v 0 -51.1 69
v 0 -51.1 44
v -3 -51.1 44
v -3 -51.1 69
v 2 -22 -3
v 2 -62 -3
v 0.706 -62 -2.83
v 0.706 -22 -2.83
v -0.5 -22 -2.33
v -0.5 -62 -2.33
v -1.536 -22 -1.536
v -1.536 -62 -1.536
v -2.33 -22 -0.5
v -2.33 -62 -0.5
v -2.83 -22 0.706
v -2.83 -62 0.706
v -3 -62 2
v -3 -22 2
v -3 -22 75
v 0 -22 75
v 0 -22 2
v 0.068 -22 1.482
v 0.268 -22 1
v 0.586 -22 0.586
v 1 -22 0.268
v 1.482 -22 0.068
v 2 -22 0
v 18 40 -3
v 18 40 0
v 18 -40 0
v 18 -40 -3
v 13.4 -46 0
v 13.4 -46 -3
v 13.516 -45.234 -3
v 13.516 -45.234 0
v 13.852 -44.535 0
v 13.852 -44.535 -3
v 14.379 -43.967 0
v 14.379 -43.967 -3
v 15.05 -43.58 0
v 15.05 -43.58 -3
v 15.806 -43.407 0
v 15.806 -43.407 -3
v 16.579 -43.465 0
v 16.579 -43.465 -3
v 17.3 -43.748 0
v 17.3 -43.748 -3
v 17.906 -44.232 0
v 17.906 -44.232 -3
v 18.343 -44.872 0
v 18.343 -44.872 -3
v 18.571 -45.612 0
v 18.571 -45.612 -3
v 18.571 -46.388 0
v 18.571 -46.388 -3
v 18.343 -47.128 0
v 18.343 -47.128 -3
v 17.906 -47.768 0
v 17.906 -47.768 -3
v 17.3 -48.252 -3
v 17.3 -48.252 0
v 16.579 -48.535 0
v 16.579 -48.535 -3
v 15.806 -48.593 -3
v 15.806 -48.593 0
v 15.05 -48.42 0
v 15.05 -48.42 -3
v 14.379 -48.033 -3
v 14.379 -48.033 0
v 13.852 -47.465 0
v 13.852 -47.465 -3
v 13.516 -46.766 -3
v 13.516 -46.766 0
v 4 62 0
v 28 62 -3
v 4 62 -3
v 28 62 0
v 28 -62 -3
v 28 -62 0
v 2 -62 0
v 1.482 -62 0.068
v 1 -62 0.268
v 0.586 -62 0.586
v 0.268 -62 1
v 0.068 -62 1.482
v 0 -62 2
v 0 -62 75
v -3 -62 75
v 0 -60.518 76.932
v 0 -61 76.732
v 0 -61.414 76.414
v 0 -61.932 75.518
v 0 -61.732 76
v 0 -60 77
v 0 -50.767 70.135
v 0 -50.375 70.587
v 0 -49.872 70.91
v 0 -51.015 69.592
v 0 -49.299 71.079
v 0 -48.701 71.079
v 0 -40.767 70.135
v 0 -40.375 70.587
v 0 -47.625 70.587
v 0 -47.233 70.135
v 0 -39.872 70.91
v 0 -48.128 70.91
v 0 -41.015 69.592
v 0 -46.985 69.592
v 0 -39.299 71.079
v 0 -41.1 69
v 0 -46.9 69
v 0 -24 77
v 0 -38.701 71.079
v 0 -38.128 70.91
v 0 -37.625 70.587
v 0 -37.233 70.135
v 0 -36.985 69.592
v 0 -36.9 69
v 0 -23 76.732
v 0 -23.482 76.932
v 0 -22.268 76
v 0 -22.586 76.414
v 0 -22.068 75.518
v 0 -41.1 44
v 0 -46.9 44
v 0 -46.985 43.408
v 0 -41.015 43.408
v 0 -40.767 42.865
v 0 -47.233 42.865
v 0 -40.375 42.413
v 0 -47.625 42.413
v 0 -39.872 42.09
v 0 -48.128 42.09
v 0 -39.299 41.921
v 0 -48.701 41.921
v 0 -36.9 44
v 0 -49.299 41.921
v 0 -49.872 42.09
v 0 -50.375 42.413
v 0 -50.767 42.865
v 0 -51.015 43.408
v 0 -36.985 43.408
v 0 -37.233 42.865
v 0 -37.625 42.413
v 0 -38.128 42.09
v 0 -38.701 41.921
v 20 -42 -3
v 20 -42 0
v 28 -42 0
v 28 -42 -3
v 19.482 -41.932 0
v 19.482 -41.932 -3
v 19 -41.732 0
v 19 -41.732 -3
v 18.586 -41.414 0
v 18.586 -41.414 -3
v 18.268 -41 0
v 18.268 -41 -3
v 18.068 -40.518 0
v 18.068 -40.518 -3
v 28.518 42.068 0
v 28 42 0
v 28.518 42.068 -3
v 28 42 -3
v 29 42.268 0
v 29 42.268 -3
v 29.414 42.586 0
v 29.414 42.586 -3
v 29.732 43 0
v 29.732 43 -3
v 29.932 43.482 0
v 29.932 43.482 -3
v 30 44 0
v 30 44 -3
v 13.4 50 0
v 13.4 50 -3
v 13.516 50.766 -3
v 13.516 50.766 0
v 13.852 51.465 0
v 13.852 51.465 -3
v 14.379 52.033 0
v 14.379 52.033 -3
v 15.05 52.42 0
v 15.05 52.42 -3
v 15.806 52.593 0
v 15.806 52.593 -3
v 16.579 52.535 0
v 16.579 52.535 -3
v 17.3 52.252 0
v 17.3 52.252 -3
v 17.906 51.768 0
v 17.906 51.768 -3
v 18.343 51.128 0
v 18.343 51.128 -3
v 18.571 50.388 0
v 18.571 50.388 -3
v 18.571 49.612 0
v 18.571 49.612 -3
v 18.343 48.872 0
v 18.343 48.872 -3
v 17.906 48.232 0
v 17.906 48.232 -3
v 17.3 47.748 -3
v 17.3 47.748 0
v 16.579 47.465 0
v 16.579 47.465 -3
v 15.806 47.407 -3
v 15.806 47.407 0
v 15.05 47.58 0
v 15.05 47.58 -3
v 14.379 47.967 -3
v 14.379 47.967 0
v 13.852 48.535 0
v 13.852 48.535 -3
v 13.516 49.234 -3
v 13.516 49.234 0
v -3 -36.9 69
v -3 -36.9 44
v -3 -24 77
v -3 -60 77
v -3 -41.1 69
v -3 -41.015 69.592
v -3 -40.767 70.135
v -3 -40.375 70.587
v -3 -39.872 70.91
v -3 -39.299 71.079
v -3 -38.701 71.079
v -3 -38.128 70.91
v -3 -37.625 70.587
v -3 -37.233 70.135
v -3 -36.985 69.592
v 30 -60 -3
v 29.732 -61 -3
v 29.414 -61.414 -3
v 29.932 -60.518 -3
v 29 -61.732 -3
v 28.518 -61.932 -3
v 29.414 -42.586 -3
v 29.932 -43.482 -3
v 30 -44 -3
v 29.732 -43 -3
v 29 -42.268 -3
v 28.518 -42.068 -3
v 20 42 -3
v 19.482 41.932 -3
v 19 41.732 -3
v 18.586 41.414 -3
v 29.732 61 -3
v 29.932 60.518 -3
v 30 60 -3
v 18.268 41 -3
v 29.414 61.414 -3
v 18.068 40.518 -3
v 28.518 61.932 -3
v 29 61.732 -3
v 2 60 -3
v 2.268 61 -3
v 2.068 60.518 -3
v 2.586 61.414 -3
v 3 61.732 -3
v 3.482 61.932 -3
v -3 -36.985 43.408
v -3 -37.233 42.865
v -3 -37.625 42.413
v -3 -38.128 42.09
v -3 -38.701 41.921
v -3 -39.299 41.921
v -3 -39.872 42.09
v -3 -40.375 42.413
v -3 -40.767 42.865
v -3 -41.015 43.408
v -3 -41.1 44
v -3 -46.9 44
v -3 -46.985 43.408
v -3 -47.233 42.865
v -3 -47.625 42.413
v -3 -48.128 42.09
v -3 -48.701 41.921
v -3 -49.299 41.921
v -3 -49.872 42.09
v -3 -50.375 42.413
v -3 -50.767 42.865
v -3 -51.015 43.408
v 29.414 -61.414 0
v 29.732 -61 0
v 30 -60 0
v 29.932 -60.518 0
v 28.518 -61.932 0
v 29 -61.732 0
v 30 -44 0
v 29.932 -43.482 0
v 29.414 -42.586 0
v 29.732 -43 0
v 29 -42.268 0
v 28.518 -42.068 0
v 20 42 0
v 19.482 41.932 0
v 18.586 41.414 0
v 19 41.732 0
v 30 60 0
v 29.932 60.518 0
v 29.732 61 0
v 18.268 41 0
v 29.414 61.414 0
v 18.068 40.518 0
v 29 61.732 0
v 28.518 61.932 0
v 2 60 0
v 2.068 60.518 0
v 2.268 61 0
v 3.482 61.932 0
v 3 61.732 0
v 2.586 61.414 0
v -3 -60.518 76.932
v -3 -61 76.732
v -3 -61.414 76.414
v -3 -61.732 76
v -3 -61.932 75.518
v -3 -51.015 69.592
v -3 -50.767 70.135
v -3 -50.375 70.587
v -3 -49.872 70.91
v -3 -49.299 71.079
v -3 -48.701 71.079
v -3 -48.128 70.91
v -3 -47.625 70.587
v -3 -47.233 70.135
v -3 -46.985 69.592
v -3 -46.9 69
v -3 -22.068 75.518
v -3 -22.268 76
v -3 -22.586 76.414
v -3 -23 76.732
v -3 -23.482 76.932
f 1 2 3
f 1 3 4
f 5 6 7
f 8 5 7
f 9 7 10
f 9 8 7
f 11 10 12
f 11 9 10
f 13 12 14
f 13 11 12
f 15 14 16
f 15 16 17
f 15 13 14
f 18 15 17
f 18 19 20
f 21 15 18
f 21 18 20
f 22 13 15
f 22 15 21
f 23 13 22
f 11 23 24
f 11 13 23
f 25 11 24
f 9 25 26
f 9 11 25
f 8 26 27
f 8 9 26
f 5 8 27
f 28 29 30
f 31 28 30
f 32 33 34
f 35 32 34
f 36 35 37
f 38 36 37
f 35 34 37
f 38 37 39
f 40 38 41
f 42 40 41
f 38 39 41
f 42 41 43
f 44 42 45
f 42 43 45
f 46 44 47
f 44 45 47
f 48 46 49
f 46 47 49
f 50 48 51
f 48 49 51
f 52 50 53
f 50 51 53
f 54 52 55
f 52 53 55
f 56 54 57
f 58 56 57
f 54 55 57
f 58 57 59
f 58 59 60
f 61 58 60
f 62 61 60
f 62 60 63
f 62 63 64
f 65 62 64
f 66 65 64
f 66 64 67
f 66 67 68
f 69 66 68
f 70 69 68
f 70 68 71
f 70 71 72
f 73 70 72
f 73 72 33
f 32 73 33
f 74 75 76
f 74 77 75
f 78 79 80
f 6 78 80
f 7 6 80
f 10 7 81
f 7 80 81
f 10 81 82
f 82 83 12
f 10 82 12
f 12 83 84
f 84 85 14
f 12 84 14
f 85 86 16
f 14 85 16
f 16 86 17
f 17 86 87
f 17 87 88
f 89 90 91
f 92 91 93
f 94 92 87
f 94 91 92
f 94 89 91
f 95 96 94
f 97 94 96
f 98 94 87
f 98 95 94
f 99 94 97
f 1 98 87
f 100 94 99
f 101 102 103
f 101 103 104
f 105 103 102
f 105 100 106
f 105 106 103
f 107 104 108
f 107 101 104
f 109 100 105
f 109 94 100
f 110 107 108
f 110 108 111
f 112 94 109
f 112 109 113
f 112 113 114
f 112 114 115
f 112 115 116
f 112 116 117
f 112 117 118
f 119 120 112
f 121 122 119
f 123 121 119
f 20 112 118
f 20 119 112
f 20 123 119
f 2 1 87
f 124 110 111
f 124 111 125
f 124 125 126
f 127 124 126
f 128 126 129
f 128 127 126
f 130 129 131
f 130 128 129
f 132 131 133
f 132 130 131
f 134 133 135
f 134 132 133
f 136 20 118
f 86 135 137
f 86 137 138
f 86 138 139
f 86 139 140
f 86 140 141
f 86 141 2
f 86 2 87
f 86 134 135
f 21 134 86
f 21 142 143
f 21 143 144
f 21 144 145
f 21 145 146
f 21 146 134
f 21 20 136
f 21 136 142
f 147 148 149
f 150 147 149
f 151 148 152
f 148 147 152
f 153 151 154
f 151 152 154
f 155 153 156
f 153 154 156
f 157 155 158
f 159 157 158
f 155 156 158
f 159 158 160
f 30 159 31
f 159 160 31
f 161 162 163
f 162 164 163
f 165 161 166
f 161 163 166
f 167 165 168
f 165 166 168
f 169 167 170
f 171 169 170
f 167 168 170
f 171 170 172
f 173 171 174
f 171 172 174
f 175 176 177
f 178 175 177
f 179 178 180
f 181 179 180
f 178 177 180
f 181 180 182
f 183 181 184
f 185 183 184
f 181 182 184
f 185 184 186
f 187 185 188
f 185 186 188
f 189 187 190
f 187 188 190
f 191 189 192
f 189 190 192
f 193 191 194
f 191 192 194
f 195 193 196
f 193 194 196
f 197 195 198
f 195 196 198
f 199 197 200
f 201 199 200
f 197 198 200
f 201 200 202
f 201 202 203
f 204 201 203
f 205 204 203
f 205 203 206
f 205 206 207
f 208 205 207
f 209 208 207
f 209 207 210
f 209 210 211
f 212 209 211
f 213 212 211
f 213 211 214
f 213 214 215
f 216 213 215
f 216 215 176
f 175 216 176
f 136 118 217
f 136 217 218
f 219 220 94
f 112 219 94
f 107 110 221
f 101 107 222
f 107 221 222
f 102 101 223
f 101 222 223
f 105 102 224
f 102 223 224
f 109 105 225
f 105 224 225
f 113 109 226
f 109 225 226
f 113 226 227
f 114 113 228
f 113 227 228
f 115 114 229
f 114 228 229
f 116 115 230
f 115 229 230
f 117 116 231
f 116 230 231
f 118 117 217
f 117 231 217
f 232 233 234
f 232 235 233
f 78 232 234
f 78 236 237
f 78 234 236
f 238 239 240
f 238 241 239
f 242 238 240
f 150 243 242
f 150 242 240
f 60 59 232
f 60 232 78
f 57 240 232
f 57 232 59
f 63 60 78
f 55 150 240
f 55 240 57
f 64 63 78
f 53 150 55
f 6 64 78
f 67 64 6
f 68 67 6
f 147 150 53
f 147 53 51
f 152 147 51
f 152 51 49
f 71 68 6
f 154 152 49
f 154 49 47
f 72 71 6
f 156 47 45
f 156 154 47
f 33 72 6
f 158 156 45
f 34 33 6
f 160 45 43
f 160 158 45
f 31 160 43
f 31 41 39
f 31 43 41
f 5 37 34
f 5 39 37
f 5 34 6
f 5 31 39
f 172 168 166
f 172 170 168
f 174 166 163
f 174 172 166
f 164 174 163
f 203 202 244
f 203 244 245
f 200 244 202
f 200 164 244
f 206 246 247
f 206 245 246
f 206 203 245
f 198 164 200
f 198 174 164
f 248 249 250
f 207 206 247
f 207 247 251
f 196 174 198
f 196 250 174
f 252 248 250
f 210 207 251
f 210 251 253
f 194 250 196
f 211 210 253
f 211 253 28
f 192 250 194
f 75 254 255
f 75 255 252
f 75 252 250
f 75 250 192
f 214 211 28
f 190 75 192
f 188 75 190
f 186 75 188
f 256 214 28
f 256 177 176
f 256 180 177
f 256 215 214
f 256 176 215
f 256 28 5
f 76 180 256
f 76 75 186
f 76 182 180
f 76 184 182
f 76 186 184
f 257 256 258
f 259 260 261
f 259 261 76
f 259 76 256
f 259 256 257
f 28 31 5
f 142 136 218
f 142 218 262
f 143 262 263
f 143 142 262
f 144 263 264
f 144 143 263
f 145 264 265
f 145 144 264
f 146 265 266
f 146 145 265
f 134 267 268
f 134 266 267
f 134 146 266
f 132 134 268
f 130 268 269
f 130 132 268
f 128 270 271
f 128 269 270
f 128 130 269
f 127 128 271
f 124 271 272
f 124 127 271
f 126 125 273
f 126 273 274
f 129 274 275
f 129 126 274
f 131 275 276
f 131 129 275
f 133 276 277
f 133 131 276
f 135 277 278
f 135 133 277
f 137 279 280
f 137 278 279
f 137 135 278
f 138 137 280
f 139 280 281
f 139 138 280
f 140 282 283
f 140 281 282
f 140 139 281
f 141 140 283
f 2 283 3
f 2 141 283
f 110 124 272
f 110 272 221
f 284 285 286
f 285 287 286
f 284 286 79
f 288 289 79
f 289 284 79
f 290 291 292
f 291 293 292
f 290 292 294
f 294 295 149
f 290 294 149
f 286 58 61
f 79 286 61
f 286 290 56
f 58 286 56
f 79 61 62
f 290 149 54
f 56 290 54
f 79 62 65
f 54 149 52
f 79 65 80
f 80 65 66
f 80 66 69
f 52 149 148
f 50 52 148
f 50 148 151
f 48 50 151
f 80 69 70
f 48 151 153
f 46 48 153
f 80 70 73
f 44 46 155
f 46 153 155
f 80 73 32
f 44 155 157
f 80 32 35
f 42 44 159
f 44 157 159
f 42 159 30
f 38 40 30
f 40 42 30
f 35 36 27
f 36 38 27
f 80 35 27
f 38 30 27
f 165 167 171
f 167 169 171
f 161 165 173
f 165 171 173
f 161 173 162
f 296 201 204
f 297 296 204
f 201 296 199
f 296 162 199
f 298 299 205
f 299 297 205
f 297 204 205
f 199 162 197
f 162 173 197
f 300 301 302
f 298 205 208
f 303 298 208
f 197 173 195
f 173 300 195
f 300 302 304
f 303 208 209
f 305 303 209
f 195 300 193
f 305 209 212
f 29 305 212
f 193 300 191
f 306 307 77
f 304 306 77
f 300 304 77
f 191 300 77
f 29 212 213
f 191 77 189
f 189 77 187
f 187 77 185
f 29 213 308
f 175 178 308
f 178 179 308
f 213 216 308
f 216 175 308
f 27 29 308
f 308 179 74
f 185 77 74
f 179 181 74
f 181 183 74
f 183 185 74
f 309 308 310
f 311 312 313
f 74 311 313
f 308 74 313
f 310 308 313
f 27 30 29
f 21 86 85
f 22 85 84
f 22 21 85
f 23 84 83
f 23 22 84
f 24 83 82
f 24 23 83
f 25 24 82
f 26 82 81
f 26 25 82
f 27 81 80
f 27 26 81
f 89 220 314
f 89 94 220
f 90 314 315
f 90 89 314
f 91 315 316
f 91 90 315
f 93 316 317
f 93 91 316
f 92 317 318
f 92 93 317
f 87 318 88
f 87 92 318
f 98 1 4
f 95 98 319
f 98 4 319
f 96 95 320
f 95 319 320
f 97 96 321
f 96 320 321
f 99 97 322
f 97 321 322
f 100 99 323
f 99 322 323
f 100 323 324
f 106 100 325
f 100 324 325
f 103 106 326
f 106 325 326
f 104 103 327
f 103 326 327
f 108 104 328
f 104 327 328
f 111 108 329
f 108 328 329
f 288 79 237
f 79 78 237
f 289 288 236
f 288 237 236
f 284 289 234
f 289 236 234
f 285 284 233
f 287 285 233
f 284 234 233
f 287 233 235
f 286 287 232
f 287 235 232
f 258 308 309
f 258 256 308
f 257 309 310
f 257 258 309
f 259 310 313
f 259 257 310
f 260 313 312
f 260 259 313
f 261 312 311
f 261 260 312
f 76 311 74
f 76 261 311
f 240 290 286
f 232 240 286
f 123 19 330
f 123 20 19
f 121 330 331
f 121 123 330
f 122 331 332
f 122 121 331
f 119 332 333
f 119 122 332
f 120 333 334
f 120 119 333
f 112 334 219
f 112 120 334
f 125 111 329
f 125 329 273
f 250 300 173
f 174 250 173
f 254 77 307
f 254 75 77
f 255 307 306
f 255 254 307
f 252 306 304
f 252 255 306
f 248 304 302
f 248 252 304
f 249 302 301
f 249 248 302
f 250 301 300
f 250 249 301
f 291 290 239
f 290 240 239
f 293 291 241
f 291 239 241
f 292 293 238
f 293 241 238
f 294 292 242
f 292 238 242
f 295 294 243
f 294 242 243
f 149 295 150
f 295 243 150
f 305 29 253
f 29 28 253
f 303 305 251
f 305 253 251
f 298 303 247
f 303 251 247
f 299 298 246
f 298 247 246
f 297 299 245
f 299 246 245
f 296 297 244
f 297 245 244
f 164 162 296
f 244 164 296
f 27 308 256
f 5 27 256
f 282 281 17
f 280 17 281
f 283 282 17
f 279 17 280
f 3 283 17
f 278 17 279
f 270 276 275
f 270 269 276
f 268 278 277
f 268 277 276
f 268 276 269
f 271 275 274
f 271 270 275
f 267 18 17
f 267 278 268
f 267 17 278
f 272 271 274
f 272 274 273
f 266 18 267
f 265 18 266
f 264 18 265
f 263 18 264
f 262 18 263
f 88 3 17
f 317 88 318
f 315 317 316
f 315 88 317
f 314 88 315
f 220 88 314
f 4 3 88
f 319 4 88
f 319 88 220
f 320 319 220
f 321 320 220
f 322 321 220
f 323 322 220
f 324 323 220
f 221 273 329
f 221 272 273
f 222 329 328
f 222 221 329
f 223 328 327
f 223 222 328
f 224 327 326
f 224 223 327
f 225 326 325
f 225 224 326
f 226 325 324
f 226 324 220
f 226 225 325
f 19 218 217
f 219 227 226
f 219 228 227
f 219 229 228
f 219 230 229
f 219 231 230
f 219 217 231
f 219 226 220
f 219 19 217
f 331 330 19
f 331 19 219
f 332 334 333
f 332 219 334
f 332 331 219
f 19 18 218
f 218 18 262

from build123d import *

# Parameters (mm, degrees)
ODGI_CIE_BAZOWE1_DEPTH             = 3
ODGI_CIE_KRAW_DZI1_STRIP_W         = 16
ODGI_CIE_KRAW_DZI1_STRIP_H         = 3
ODGI_CIE_KRAW_DZI1_STRIP_CUT_DEPTH = 124
ODGI_CIE_KRAW_DZI1_DEPTH           = 124
WYTNIJ_WYCI_GNI_CIE1_DEPTH         = 84
OTW_R_5_2_5_2_1_D                  = 5.2
OTW_R_4_2_4_2_1_D                  = 4.2
WYTNIJ_WYCI_GNI_CIE2_DEPTH         = 104.310212467
ZAOKR_GLENIE1_R                    = 2


# Sheet-metal steps are written as plain solids
with BuildPart() as part:
    # Szkic1 → Odgięcie bazowe1 (new body)
    with BuildSketch(Plane.XY):
        Polygon((30, -42), (30, -62), (0, -62), (0, 62), (30, 62), (30, 42), (18, 42), (18, -42), align=None)
    extrude(amount=-ODGI_CIE_BAZOWE1_DEPTH)

    # Odgięcie krawędzi1 strip (across the edge) → Odgięcie krawędzi1 strip cut (cut)
    with BuildSketch(Plane.XZ.offset(-62)):
        with Locations((-6, -1.5)):
            Rectangle(ODGI_CIE_KRAW_DZI1_STRIP_W, ODGI_CIE_KRAW_DZI1_STRIP_H)
    extrude(amount=ODGI_CIE_KRAW_DZI1_STRIP_CUT_DEPTH, mode=Mode.SUBTRACT)

    # Odgięcie krawędzi1 section (across the edge) → Odgięcie krawędzi1 (add)
    with BuildSketch(Plane.XZ.offset(-62)):
        with BuildLine():
            Line((-3, 2), (-3, 77))
            Line((-3, 77), (0, 77))
            Line((0, 77), (0, 2))
            ThreePointArc((0, 2), (0.585786438, 0.585786438), (2, 0))
            Line((2, 0), (2, -3))
            ThreePointArc((2, -3), (-1.535533906, -1.535533906), (-3, 2))
        make_face()
    extrude(amount=ODGI_CIE_KRAW_DZI1_DEPTH)

    # Szkic10 → Wytnij-wyciągnięcie1 (cut)
    with BuildSketch(Plane(origin=(0, 62, 0), x_dir=(1, 0, 0), z_dir=(0, 1, 0))):
        with BuildLine():
            Line((2, 0), (2, 3))
            ThreePointArc((2, 3), (-1.535533906, 1.535533906), (-3, -2))
            Line((-3, -2), (-3, -77))
            Line((-3, -77), (0, -77))
            Line((0, -77), (0, -2))
            ThreePointArc((0, -2), (0.585786438, -0.585786438), (2, 0))
        make_face()
    extrude(amount=-WYTNIJ_WYCI_GNI_CIE1_DEPTH, mode=Mode.SUBTRACT)

    # Otwór Ø5.2 (5.2)1 (through all)
    with Locations(Plane(origin=(16, -46, 0), x_dir=(1, 0, 0), z_dir=(0, 0, 1))):
        with Locations((0, 0), (0, 96)):
            Hole(OTW_R_5_2_5_2_1_D / 2)

    # Otwór Ø4.2 (4.2)1 (through all)
    with Locations(Plane(origin=(0, -49, 69), x_dir=(0, 0, 1), z_dir=(1, 0, 0))):
        with Locations((0, 0), (0, -10)):
            Hole(OTW_R_4_2_4_2_1_D / 2)

    # Szkic14 → Wytnij-wyciągnięcie2 (cut, through all)
    with BuildSketch(Plane(origin=(0, 0, 0), x_dir=(0, 0, -1), z_dir=(1, 0, 0))):
        with BuildLine():
            Line((-69, -46.9), (-44, -46.9))
            ThreePointArc((-44, -46.9), (-41.9, -49), (-44, -51.1))
            Line((-44, -51.1), (-69, -51.1))
            ThreePointArc((-69, -51.1), (-71.1, -49), (-69, -46.9))
        make_face()
        with BuildLine():
            Line((-69, -36.9), (-44, -36.9))
            ThreePointArc((-44, -36.9), (-41.9, -39), (-44, -41.1))
            Line((-44, -41.1), (-69, -41.1))
            ThreePointArc((-69, -41.1), (-71.1, -39), (-69, -36.9))
        make_face()
    extrude(amount=-WYTNIJ_WYCI_GNI_CIE2_DEPTH, mode=Mode.SUBTRACT)

    # Zaokrąglenie1
    zaokr_glenie1_edges = [part.edges().sort_by_distance(p)[0] for p in [
        (30, 62, -1.5),
        (30, 42, -1.5),
        (18, 42, -1.5),
        (18, -42, -1.5),
        (30, -42, -1.5),
        (30, -62, -1.5),
        (2, 62, -1.5),
        (-1.5, -62, 77),
        (-1.5, -22, 77),
    ]]
    fillet(zaokr_glenie1_edges, radius=ZAOKR_GLENIE1_R)


solid = part.part
